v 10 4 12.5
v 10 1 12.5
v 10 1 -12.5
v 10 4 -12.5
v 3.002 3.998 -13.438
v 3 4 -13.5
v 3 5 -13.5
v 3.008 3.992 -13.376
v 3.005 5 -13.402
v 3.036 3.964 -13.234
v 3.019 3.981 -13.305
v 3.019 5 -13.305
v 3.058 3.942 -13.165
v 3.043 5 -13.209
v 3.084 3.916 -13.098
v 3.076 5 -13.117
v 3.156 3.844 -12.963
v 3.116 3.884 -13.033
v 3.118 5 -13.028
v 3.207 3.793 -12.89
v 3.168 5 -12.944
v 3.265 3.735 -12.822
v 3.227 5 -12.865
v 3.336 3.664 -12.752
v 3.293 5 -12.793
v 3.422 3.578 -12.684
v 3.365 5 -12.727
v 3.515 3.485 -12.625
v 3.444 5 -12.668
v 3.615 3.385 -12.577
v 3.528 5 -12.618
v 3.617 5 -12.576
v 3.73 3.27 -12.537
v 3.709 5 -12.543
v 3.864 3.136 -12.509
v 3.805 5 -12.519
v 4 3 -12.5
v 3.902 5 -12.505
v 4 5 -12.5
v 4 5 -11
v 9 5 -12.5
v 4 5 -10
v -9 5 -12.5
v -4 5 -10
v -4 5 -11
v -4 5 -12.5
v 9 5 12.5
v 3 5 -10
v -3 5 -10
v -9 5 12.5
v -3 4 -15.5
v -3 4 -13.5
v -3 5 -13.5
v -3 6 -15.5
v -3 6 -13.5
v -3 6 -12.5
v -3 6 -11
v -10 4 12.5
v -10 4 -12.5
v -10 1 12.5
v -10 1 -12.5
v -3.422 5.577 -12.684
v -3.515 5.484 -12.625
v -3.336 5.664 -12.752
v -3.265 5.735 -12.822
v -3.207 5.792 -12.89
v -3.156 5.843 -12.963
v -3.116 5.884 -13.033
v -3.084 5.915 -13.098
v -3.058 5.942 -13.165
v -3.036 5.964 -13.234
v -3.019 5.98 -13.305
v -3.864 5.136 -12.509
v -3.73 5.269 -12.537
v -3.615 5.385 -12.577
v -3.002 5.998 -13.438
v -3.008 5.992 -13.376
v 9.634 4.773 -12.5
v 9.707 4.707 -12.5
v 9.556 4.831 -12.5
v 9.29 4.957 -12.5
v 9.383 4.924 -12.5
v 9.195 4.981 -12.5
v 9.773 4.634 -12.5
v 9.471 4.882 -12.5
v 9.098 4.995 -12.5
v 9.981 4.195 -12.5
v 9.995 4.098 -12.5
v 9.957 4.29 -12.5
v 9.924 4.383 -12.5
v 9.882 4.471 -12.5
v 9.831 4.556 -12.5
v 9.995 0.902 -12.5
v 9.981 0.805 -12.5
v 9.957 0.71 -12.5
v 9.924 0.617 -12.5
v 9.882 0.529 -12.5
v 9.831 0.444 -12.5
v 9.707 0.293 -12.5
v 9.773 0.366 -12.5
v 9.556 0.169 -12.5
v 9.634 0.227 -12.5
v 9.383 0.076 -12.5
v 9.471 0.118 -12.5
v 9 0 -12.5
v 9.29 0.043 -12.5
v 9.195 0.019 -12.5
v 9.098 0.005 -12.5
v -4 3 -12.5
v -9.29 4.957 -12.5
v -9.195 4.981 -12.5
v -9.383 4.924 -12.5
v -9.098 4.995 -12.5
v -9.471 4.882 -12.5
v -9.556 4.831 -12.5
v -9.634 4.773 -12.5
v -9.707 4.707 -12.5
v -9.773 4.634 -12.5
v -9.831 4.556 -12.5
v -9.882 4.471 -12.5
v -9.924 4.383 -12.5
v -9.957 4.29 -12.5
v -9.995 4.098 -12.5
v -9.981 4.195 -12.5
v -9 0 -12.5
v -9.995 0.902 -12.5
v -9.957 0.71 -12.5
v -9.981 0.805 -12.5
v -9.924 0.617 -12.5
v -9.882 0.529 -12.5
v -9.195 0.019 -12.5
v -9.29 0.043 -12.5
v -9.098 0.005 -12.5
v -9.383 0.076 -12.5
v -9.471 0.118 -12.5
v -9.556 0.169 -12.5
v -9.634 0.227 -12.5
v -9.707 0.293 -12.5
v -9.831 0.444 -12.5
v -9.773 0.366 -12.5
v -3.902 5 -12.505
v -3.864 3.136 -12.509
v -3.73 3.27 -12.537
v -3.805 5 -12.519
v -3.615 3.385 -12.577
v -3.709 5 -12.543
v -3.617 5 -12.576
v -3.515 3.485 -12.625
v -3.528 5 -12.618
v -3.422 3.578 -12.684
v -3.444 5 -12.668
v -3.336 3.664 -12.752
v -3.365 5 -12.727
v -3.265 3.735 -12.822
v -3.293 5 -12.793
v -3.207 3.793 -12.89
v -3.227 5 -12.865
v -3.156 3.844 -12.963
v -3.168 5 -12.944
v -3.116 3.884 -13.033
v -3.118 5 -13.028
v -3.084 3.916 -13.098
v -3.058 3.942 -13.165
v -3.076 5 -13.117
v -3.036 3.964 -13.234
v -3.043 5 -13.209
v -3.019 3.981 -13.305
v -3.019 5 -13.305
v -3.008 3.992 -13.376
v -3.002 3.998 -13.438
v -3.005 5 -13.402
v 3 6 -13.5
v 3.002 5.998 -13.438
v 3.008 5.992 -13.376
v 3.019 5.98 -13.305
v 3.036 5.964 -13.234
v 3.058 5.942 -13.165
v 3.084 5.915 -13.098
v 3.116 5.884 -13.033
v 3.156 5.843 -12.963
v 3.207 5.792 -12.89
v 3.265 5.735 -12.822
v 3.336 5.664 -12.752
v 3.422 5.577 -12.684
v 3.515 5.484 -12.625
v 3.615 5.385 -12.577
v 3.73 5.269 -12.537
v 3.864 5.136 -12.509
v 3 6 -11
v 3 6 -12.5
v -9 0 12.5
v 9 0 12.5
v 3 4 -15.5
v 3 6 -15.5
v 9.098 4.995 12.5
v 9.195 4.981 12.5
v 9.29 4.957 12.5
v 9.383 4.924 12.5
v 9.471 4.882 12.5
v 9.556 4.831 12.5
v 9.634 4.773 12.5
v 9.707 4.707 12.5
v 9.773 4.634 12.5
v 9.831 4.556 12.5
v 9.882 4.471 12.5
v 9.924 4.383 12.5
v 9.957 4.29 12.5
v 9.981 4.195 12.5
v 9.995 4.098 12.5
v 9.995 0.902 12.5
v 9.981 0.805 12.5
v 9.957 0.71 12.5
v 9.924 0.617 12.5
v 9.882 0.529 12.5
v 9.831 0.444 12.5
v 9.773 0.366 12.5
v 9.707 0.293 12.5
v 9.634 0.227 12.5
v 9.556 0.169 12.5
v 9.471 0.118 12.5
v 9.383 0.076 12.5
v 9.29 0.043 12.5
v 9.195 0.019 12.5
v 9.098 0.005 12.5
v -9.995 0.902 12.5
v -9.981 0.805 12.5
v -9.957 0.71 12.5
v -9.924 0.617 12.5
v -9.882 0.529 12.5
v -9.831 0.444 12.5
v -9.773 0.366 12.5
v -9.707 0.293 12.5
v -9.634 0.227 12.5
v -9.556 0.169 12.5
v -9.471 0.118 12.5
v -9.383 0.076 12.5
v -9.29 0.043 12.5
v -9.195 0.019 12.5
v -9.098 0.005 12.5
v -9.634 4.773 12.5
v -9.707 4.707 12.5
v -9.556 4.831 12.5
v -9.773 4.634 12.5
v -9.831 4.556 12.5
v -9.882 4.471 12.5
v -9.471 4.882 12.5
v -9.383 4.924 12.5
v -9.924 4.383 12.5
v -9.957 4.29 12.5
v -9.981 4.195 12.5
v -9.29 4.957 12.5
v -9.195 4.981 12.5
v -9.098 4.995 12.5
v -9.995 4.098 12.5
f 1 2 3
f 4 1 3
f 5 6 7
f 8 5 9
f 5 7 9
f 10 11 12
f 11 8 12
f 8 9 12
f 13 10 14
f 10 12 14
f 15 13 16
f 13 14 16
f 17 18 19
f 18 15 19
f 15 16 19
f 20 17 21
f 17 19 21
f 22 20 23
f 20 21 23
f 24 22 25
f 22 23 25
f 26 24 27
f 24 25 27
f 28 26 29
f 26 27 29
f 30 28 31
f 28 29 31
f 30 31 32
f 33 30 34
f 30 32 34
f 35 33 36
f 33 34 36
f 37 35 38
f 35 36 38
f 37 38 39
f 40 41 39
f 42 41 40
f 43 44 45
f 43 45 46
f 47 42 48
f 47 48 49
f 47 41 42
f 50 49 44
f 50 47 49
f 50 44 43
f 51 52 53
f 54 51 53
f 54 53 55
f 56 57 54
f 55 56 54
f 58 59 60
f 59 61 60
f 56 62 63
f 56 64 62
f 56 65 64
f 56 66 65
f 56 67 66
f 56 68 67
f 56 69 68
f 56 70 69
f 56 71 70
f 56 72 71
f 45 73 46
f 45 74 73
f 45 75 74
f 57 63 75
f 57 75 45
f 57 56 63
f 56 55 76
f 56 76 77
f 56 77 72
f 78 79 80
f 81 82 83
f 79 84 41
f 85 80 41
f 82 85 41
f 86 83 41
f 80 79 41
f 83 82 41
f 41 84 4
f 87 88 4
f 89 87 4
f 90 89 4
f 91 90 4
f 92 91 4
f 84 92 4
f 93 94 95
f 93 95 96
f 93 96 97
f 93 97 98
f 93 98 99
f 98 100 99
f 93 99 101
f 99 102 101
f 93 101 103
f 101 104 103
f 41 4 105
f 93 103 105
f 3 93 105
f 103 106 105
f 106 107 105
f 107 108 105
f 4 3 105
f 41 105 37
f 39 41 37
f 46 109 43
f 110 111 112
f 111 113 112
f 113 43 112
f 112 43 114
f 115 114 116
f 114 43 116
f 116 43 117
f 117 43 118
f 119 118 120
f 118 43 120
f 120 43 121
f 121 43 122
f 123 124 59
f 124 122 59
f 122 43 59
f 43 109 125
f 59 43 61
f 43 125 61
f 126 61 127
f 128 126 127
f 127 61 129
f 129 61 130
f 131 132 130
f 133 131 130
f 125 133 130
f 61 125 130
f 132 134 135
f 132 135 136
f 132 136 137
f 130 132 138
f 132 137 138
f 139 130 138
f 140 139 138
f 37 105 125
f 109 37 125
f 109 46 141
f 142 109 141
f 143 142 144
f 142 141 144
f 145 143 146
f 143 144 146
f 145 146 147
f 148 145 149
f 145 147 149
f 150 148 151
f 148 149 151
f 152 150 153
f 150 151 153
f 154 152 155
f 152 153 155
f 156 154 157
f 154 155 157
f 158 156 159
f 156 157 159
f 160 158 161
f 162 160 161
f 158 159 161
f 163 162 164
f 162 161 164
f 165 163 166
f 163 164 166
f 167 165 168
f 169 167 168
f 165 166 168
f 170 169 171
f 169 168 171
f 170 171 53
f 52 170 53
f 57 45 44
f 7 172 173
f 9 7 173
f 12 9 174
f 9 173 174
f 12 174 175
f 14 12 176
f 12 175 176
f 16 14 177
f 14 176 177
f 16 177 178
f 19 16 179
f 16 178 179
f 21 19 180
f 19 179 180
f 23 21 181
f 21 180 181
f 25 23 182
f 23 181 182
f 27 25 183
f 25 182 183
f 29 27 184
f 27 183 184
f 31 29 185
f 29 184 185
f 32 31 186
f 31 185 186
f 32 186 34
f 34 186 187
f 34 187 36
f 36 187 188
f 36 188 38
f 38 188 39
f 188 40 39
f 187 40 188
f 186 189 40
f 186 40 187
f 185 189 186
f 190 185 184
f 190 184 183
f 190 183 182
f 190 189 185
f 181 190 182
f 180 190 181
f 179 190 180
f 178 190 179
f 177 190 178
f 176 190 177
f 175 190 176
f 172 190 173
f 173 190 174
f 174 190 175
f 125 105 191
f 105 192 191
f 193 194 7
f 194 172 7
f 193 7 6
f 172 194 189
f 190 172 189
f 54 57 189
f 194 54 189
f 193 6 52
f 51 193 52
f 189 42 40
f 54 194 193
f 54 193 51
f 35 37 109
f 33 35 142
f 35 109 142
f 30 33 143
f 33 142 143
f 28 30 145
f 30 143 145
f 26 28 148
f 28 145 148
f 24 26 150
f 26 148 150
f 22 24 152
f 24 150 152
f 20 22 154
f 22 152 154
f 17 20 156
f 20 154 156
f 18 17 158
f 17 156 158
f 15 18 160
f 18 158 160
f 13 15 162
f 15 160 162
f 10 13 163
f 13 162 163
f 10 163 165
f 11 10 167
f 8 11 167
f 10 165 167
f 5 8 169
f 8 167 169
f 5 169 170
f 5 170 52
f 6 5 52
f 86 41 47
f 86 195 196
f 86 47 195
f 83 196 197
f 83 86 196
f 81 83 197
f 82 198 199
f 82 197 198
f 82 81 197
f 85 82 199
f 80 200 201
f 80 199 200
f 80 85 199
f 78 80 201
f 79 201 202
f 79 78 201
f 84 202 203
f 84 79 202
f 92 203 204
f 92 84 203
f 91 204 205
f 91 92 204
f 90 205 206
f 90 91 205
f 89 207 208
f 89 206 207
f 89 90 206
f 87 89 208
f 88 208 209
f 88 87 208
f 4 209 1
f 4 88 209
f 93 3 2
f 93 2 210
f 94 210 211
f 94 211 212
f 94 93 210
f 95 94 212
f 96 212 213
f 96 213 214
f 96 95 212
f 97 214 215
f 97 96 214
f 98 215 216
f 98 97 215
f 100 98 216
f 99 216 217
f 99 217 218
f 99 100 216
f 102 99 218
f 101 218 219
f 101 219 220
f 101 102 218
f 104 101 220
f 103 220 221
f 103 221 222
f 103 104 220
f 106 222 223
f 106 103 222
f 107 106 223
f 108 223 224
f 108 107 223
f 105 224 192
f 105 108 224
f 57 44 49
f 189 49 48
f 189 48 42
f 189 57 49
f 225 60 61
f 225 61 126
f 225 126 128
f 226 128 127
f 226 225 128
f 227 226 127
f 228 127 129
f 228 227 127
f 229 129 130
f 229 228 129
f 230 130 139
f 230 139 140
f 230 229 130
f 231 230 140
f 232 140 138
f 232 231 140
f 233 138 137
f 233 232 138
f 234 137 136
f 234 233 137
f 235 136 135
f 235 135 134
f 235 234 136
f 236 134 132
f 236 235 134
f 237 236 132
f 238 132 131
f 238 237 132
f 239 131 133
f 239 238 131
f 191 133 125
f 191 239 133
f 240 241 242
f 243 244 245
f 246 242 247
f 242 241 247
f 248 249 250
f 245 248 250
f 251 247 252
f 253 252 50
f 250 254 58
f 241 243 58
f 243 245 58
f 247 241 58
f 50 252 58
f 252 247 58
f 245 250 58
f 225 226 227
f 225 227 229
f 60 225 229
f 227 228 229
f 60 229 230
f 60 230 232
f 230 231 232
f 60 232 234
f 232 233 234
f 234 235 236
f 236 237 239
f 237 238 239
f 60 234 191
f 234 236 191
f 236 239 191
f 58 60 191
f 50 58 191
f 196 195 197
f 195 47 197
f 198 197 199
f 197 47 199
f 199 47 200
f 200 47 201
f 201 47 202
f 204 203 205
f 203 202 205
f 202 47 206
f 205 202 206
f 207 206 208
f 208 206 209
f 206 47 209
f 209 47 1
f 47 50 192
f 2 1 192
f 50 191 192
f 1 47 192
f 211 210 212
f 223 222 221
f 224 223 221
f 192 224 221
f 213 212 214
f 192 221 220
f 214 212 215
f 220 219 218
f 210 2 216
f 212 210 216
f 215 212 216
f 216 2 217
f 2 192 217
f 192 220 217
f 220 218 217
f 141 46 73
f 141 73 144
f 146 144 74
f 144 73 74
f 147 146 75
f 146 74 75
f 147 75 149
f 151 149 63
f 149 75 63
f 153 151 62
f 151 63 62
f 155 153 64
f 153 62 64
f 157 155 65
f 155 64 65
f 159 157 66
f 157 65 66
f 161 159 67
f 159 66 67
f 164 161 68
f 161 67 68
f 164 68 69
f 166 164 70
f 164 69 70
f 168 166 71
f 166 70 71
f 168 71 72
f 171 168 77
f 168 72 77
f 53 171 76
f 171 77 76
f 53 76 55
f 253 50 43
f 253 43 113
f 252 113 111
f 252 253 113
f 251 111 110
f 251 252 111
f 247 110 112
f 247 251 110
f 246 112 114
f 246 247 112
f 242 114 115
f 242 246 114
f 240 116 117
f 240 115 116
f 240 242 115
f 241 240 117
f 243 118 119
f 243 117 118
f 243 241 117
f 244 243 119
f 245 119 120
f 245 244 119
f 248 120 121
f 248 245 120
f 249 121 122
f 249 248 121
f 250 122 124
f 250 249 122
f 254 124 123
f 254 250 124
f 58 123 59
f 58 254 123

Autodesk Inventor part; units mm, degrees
ref_plane "YZ Plane" through (0, 0, 0) normal (1, 0, 0) x (0, 1, 0)
ref_plane "XZ Plane" through (0, 0, 0) normal (0, 1, 0) x (-1, 0, 0)
ref_plane "XY Plane" through (0, 0, 0) normal (0, 0, 1) x (1, 0, 0)
sketch "Skizze1" plane through (0, 0, 0) normal (0, 1, 0) x (-1, 0, 0)
  line L0 (10, 12.5) -> (-10, 12.5)
  line L1 (-10, 12.5) -> (-10, -12.5)
  line L2 (-10, -12.5) -> (10, -12.5)
  line L3 (10, -12.5) -> (10, 12.5)
  line L4 (10, 12.5) -> (-10, -12.5) construction
  line L5 (-10, 12.5) -> (10, -12.5) construction
  point P0 (0, 0)
  dimension "d0" = 20
  dimension "d1" = 25
extrude "Extrusion1" add sketch "Skizze1" along normal blind 5
fillet "Rundung1" radius 1 4 edges at (-10, 5, 0) (-10, 0, 0) (10, 5, 0) (10, 0, 0)
sketch "Skizze2" plane through (9, 0, -12.5) normal (0, 0, -1) x (-1, 0, 0)
  line L0 (0, 5) -> (18, 5) projected
  line L1 (6, 4) -> (12, 4)
  line L2 (12, 4) -> (12, 6)
  line L3 (12, 6) -> (6, 6)
  line L4 (6, 6) -> (6, 4)
  line L5 (6, 4) -> (12, 6) construction
  line L6 (12, 4) -> (6, 6) construction
  point P0 (9, 0)
  point P1 (9, 5)
  dimension "d5" = 2
  dimension "d6" = 6
extrude "Extrusion2" add sketch "Skizze2" along normal blind 3 and the other way blind 1.5
chamfer "Fasen1" distance 1 angle 45 1 edges at (0, 5, -11)
chamfer "Fasen2" distance 1 angle 45 2 edges at (-3, 5, -10.5002) (-3, 5, -11.75)
chamfer "Fasen3" distance 1 angle 45 2 edges at (3, 5, -10.5003) (3, 5, -11.75)
fillet "Rundung2" radius 1 5 edges at (3, 5.4998, -12.5) (3, 4.5, -12.5) (0, 4, -12.5) (-3, 4.5, -12.5) (-3, 5.4998, -12.5)
properties part number "Batterie" material "Nylon 6/6"
